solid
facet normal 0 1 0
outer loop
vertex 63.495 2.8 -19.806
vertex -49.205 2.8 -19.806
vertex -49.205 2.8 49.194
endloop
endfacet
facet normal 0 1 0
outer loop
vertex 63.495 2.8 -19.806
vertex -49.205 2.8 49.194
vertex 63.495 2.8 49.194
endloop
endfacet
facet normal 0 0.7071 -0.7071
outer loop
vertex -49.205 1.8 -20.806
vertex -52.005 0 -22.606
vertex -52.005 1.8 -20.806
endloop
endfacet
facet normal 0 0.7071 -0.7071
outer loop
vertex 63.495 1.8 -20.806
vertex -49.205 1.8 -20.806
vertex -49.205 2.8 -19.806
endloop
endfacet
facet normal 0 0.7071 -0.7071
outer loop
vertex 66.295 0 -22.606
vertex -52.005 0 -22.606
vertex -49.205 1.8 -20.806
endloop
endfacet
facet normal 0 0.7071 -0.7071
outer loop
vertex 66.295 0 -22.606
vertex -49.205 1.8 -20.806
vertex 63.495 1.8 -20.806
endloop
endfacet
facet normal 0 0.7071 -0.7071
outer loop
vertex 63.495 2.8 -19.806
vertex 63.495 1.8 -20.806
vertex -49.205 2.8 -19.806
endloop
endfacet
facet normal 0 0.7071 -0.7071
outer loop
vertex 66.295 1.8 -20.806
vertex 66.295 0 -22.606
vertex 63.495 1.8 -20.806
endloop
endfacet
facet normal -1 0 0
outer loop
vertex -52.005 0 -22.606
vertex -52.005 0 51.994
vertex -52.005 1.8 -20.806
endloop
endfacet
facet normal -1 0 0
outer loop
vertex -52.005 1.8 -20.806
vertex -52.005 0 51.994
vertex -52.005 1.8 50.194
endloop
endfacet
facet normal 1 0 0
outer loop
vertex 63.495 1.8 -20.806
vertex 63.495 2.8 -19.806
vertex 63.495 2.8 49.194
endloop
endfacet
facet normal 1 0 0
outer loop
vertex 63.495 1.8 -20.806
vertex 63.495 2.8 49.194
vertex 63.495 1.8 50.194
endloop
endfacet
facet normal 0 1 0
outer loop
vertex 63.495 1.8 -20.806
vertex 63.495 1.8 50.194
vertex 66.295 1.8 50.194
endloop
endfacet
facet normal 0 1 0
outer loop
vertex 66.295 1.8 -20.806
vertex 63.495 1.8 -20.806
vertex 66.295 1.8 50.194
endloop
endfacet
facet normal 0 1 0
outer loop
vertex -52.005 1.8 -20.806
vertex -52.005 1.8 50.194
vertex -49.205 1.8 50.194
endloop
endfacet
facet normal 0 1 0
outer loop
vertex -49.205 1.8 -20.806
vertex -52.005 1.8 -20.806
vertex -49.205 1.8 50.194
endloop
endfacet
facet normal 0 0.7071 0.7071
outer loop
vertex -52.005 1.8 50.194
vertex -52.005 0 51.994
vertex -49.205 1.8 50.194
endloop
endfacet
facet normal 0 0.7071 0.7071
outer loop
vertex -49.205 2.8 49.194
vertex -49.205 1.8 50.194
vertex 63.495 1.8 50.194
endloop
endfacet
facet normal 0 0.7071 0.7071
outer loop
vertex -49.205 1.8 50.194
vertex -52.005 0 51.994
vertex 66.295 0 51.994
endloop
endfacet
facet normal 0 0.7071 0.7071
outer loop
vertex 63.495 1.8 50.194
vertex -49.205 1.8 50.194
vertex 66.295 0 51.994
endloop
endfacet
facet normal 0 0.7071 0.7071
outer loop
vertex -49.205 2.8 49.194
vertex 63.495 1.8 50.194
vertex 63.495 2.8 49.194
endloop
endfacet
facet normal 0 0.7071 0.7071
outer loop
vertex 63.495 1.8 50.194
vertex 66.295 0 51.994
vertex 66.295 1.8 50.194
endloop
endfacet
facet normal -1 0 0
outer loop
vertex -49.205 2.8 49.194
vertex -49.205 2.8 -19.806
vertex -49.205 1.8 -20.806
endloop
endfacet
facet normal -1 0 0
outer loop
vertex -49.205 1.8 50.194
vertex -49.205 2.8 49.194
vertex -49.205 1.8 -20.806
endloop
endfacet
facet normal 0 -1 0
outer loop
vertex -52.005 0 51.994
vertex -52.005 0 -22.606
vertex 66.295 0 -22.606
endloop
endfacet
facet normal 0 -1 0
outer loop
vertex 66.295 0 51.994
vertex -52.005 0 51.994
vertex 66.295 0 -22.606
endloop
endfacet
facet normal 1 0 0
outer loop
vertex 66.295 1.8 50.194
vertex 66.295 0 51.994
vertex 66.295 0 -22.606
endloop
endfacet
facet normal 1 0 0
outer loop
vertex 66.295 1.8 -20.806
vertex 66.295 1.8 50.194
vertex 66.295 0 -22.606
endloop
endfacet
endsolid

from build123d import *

# Parameters (mm, degrees)
SKETCH_1_W          = 118.3
SKETCH_1_H          = 74.6
EXTRUDE_1_DEPTH     = 2.8
SKETCH_2_W          = 2.8
SKETCH_2_H          = 74.6
CUT_EXTRUDE_1_DEPTH = 1
CUT_EXTRUDE_2_DEPTH = 130.252166362


with BuildPart() as part:
    # 草图1 → 凸台-拉伸1 (new body)
    with BuildSketch(Plane(origin=(0, 0, 0), x_dir=(1, 0, 0), z_dir=(0, 1, 0))):
        with Locations((7.144851485, -14.694158416)):
            Rectangle(SKETCH_1_W, SKETCH_1_H)
    extrude(amount=EXTRUDE_1_DEPTH)

    # 草图2 → 切除-拉伸1 (cut)
    with BuildSketch(Plane(origin=(0, 2.8, 0), x_dir=(1, 0, 0), z_dir=(0, 1, 0))):
        with Locations((64.894851485, -14.694158416)):
            Rectangle(SKETCH_2_W, SKETCH_2_H)
        with Locations((-50.605148515, -14.694158416)):
            Rectangle(SKETCH_2_W, SKETCH_2_H)
    extrude(amount=-CUT_EXTRUDE_1_DEPTH, mode=Mode.SUBTRACT)

    # 草图3 → 切除-拉伸2 (cut, through all)
    with BuildSketch(Plane(origin=(66.294851485, 0, 0), x_dir=(0, 0, -1), z_dir=(1, 0, 0))):
        Polygon((-51.994158416, 0), (-49.194158416, 2.8), (-51.994158416, 2.8), align=None)
        Polygon((22.605841584, 0), (19.805841584, 2.8), (22.605841584, 2.8), align=None)
    extrude(amount=-CUT_EXTRUDE_2_DEPTH, mode=Mode.SUBTRACT)


solid = part.part
